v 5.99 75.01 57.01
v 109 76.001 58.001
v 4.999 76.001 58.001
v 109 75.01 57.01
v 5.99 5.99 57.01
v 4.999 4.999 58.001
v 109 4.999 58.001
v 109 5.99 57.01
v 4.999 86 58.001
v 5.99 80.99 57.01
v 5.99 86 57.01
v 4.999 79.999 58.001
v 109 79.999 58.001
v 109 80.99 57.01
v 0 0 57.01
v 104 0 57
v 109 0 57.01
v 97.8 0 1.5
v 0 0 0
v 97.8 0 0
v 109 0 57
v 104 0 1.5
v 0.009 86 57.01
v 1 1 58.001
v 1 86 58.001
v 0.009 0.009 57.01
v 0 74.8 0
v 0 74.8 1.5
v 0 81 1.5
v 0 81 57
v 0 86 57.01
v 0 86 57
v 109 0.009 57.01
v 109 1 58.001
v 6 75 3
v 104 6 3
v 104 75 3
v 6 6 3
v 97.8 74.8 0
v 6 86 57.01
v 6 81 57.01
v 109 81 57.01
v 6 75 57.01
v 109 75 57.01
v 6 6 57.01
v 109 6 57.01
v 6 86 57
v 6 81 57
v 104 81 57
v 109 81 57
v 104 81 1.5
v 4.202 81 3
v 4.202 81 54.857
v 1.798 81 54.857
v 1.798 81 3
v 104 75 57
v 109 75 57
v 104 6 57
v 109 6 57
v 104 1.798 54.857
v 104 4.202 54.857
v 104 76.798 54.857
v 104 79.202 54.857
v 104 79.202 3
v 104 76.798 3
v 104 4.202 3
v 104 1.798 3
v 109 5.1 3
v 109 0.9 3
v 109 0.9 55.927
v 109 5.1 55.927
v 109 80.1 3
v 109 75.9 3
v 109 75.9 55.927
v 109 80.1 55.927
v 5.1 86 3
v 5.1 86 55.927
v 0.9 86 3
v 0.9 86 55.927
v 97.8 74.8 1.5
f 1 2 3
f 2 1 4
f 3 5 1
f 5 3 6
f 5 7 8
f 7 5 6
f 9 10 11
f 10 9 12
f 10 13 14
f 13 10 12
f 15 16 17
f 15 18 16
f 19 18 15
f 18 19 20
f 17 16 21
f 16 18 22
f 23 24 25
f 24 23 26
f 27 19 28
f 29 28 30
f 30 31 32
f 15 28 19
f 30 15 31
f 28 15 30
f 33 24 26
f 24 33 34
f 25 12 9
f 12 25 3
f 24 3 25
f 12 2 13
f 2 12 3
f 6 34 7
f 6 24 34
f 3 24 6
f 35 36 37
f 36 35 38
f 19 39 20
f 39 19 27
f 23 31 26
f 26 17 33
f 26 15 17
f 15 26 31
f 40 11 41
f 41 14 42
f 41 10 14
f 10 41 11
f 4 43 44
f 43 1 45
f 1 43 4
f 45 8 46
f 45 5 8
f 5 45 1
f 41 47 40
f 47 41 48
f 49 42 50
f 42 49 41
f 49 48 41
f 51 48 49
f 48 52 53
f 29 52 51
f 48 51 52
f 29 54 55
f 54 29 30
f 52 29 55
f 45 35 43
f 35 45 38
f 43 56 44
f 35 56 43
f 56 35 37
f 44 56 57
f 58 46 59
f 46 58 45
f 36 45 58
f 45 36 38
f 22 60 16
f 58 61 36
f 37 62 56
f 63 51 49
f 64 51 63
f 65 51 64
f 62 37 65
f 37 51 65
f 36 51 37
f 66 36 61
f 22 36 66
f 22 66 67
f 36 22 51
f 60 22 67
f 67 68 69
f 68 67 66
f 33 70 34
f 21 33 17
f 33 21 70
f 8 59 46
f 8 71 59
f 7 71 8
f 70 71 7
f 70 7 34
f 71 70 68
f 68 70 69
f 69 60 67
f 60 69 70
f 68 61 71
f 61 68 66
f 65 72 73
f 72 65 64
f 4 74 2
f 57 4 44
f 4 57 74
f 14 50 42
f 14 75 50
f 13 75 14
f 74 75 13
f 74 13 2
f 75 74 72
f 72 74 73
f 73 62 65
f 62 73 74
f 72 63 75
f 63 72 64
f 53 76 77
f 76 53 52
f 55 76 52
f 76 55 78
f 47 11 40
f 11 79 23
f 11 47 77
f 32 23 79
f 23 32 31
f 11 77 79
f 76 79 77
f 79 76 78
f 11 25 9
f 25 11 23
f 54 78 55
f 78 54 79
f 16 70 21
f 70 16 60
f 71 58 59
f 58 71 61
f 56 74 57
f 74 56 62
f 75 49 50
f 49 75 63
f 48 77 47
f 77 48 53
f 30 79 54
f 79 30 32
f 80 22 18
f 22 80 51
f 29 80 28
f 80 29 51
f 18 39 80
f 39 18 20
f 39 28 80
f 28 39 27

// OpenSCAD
// ============================================================================
// cutlery_box.scad
// Graduated 3-chamber disposable-cutlery box (Option 3) — CUT-FROM-SOLID port
// of build_box.py, for a 120 x 120 x 120 mm printer (AOSEED).
//
// WHY THIS PORT EXISTS (the whole point):
//   The hand-mesh generator (build_box.py) could not keep the 1 mm rim chamfer
//   continuous across the female dovetail joints, because where a slot's flared
//   corner crosses the sloped chamfer it needs a true boolean intersection.
//   OpenSCAD HAS that boolean kernel, so here we do exactly the "cut-from-solid"
//   thing:
//      1. Build the ENTIRE box as ONE solid, WITH the chamfer already on it.
//      2. difference() out vertical dovetail prisms ( /_\ cross-section ),
//         running from just above the base plate up THROUGH the rim, to both
//         (a) form the sliding-dovetail joints, and
//         (b) split the box into 6 bed-sized pieces.
//   Because the cut is a real boolean through the already-chamfered solid, the
//   sloped chamfer<->slot edge is produced for free => the rim chamfer stays
//   CONTINUOUS across every joint, with none of the sliver hacks.
//
// ----------------------------------------------------------------------------
// HOW TO USE
//   In the app:  set `part` below (or use the Customizer dropdown), F5 to
//                preview, F6 to render, then File > Export > STL.
//   One piece (CLI):
//      openscad -o body_knife_A.stl -D 'part="knife_A"' cutlery_box.scad
//   ALL SIX (bash, run from this folder):
//      for p in knife_A knife_B fork_A fork_B spoon_A spoon_B; do \
//        openscad -o "body_$p.stl" -D "part=\"$p\"" cutlery_box.scad ; done
//   PNG preview of one piece:
//      openscad -o knife_B.png --imgsize=1400,1000 --autocenter --viewall \
//        -D 'part="knife_B"' cutlery_box.scad
//
//   Pieces are modelled in ASSEMBLED coordinates (floor-down, z=0 is the bed),
//   so importing all six STLs together shows the assembled box directly; your
//   slicer will auto-drop each one onto the plate for printing.
//
// BED SANITY: every piece is <= 120 mm in X, Y, Z.
//   Z = 58 mm. Widest piece = spoon at 117 mm (Y). A-halves reach 109 mm (X,
//   including the protruding dovetail key). All under 120.
//
// !! I could NOT run OpenSCAD to verify this file (no binary in my sandbox) !!
//   - The rim chamfer is a SMOOTH, true-45 bevel built from hull() frustums of
//     convex rectangles. Works in every OpenSCAD since ~2015 (incl. Homebrew
//     2021.01). No stepped staircase -- and, crucially, it makes box() a clean
//     well-formed solid so the per-part booleans resolve reliably (the old
//     14-slice staircase was fragile and CGAL was dropping the walls of the
//     interior parts, leaving only the key prisms => "floating boxes").
//   - roof() is still available behind USE_ROOF=true for those who have it
//     (2021.01+ snapshots); for THIS rectangular design it is identical, so it
//     is NOT required.
//   - After F6, check the console for "WARNING"/"not a valid 2-manifold".
//     If a tenon ever looks detached, bump EPS to 0.05.
// ============================================================================


/* [Part to render / export] */
part = "knife_A"; // [knife_A, knife_B, fork_A, fork_B, spoon_A, spoon_B, assembly]

/* [Chamfer method] */
// false = smooth hull() frustum bevel (default, any OpenSCAD); true = roof() (2021.01+)
USE_ROOF = false;

/* [Heights (mm)] */
BASE   = 3.0;     // floor / base-plate thickness
COMP_H = 55.0;    // interior wall height above the floor (cutlery stack depth)

/* [Walls (mm)] */
HOST_T   = 6.0;     // thickness of every wall (thick enough to host a dovetail)
HALF_LEN = 104.0;   // printed length of each half (A = near, B = far); <120 incl. key

/* [Chamber bays (mm)] */
N_COL     = 3;       // columns of cutlery per chamber
KNIFE_COL = 23.0;    // -> knife bay 69  (3 x 19 mm knives + play)
FORK_COL  = 33.0;    // -> fork  bay 99  (3 x 29 mm forks  + play)
SPOON_COL = 37.0;    // -> spoon bay 111 (3 x 34 mm spoons + play, trimmed <120)

/* [Dovetail joint (mm)] */
DT_DEPTH = 5.0;   // tail protrusion past the seam (male key depth)
DT_NECK  = 1.2;   // half-width at the seam face (narrow)
DT_FLARE = 2.1;   // half-width at the tip (wide -> locks)
DT_CLR   = 0.4;   // FLANK/seam slide clearance added to the female socket (do not change for fit)
DT_DEPTH_RELIEF = 0.3; // extra depth on the socket BACK only, so the tail tip never bottoms out

/* [Hidden-dovetail top cap / "hat" (mm)] */
// The dovetail otherwise shows its trapezoid outline on the TOP edge of the wall.
// To hide it, the MALE piece extends the wall's full-width top (chamfer included)
// across the key footprint -> a flush, continuous top. The FEMALE piece gets a
// matching top RECESS (cap footprint + CAP_CLR) so the cap drops straight in.
// Result: the top reads as one surface with a single straight seam line at the cap
// tip; the dovetail joinery lives entirely below the cap.
//
// SELF-SUPPORTING UNDERSIDE: the cap reaches the FULL wall width at the chamfer base
// (so the top edge reads as the wall extended, with NO recessed sliver on the outer
// face), and its underside is ONE planar ramp from the chamfer's OUTER CORNER
// (half-width HOST_T/2 at z = BODY_H-CHAMFER) down to the dovetail-neck half-width
// (CAP_FOOT) at CAP_SLANT_DEG from horizontal. No little horizontal step. The ramp
// reaching full width exactly at the chamfer base means "ramp top" == "chamfer base"
// (CAP_H is DERIVED). The FEMALE recess is the same ramp + CAP_CLR play.
// TRADEOFF: because the cap runs all the way to the outer corner, the female wall
// tapers to ~0 at z = BODY_H-CHAMFER -> a thin feather edge at the joint (gradual at
// CAP_SLANT_DEG, hidden inside the joint when assembled). Accepted per design intent.
CAP_SLANT_DEG = 50;     // cap underside ramp angle from horizontal (50 = self-supporting, long flare)
CAP_FOOT = DT_NECK;     // cap-underside half-width where it meets the dovetail neck
CAP_CLR = 0.3;          // slide clearance so the male cap seats into the female top recess

/* [Rim chamfer (mm)] */
CHAMFER = 1.0;    // 45-deg comfort break broken along the top wall edges

/* [Base half-lap / anti-warp (mm)] */
// Neighbouring base plates overlap as a HORIZONTAL half-lap (shiplap) at mid-base
// height, so corners stay coplanar (no lift/protrusion). Horizontal lap faces do
// NOT bind the vertical-drop assembly. Shingle direction: A->B and knife->fork->spoon.
LAP_LEN = 6;        // overlap past the A/B seam and the knife/fork seam
LAP_LEN_FS = 2;     // overlap past the fork/SPOON seam -- SMALLER: spoon is the
                    // tightest piece (117mm of the 120mm bed); a 6mm lap there
                    // would push spoon to 123mm. 2mm keeps spoon at 119mm.
LAP_Z   = BASE/2;   // 1.5 -- horizontal split height of the lap (bottom vs top half)
LAP_CLR = 0.2;      // in-plane clearance so the shelf isn't a press fit


/* [Hidden] */
EPS      = 0.01;          // tiny overlap so abutting solids fuse cleanly in CGAL
// Upper-chamber pieces (fork, spoon) were cut by a cell plane laid EXACTLY on the
// divider wall's far face (the lower chamber owns that wall). intersection() along a
// plane coincident with an existing box face makes CGAL leave a ZERO-THICKNESS copy
// of the wall face -> edge-manifold + "watertight" but degenerate (OpenSCAD shows it
// as a blue back-face; Tinkercad thickens it into a phantom block). SEAM_EPS nudges
// those cut planes a hair INTO the open bay so they no longer coincide with any box
// face -> no flap. 0.02 mm is physically nothing but is well clear of CGAL's tolerance.
SEAM_EPS = 0.02;
CUT_OVER = 1.0;           // how far dovetail cutters overshoot the rim (clean cut)

BODY_H    = BASE + COMP_H;     // 58  total height
END_WALL  = HOST_T;            // end walls are dovetail hosts too -> equally thick
TOTAL_LEN = 2 * HALF_LEN;      // 208 assembled length (end wall .. end wall)

// hidden-cap ramp geometry (derived).
//   CAP_HW    = cap MAX half-width = HOST_T/2 (the full wall edge) at the chamfer base.
//   CAP_RISE  = vertical height of the self-supporting CAP_SLANT_DEG underside ramp.
//   CAP_ZRAMP = where the cap reaches full width = the chamfer base (BODY_H-CHAMFER), so
//               the ramp runs straight to the chamfer OUTER CORNER (no horizontal step).
//   CAP_ZBOT  = cap bottom = ramp start; CAP_H derived from it (for reference/report).
//   CAP_ZRAMP_R = recess ramp top, shifted down by CAP_CLR so the recess ramp stays
//               parallel to the cap ramp with uniform play.
CAP_HW      = HOST_T/2;   // cap reaches the FULL wall edge at the chamfer base
CAP_RISE    = (CAP_HW - CAP_FOOT) * tan(CAP_SLANT_DEG);
CAP_ZRAMP   = BODY_H - CHAMFER;               // full width exactly at the chamfer base / outer corner
CAP_ZBOT    = CAP_ZRAMP - CAP_RISE;
CAP_H       = BODY_H - CAP_ZBOT;              // derived; reported
CAP_ZRAMP_R = (CAP_ZBOT - CAP_CLR) + CAP_RISE;
// sanity checks
assert(CAP_ZBOT > BASE + 1,
       "cap zone dips too low -- raise CAP_SLANT_DEG");
assert(CAP_HW >= DT_FLARE,
       "cap too narrow to cover the dovetail tail");

// bay widths
KNIFE_BAY = N_COL * KNIFE_COL; // 69
FORK_BAY  = N_COL * FORK_COL;  // 99
SPOON_BAY = N_COL * SPOON_COL; // 111

// ---- Y layout (width direction): wall | bay | divider | bay | divider | bay | wall
KNIFE_Y0 = 0;
KNIFE_Y1 = HOST_T + KNIFE_BAY + HOST_T;        // 0..81   (outer wall + bay + divider)
FORK_Y0  = KNIFE_Y1;                           // 81
FORK_Y1  = FORK_Y0 + FORK_BAY + HOST_T;        // 81..186 (bay + divider)
SPOON_Y0 = FORK_Y1;                            // 186
SPOON_Y1 = SPOON_Y0 + SPOON_BAY + HOST_T;      // 186..303(bay + outer wall)
EXT_W    = SPOON_Y1;                           // 303 total width

// lengthwise wall Y-bands [y0,y1] (host the A/B dovetails) + their centers
OUTER_L  = [0, HOST_T];                                       // [0,6]    c=3
DIV_KF   = [HOST_T + KNIFE_BAY, HOST_T + KNIFE_BAY + HOST_T]; // [75,81]  c=78
DIV_FS   = [FORK_Y0 + FORK_BAY, FORK_Y0 + FORK_BAY + HOST_T]; // [180,186]c=183
OUTER_R  = [SPOON_Y1 - HOST_T, SPOON_Y1];                     // [297,303]c=300

// the three OPEN bays are rectangular holes in the wall footprint:
//   footprint = outer rectangle MINUS these bays  (== the 6 walls; verified).
// The smooth chamfer is built from exactly this decomposition.
BAY_X0 = END_WALL;              // 6
BAY_X1 = TOTAL_LEN - END_WALL;  // 202
BAYS = [
    [BAY_X0, BAY_X1, HOST_T,   HOST_T + KNIFE_BAY],   // knife bay [6,202] x [6,75]
    [BAY_X0, BAY_X1, FORK_Y0,  FORK_Y0 + FORK_BAY],   // fork  bay [6,202] x [81,180]
    [BAY_X0, BAY_X1, SPOON_Y0, SPOON_Y0 + SPOON_BAY], // spoon bay [6,202] x [186,297]
];

YC_OUTL  = OUTER_L[0] + HOST_T/2;   // 3   outer-left wall center
YC_DIVKF = DIV_KF[0]  + HOST_T/2;   // 78  knife/fork divider center
YC_DIVFS = DIV_FS[0]  + HOST_T/2;   // 183 fork/spoon divider center
YC_OUTR  = OUTER_R[0] + HOST_T/2;   // 300 outer-right wall center

// seams
AB_SEAM = HALF_LEN;               // 104  A/B length seam (x)
SEAM_KF = FORK_Y0;                // 81   knife/fork width seam (y)
SEAM_FS = SPOON_Y0;              // 186  fork/spoon width seam (y)
ENDC_A  = END_WALL/2;             // 3    A end-wall center (x) -> chamber dovetails
ENDC_B  = TOTAL_LEN - END_WALL/2; // 205  B end-wall center (x)


// ============================================================================
// 2D wall footprint (cross-section of all walls, constant in z for the straight
// part). Union of: 2 full-width end walls + 4 lengthwise walls between them.
// ============================================================================
module wall_footprint_2d() {
    // footprint = outer rectangle minus the 3 open bays  (== the 6 walls)
    difference() {
        square([TOTAL_LEN, EXT_W]);
        for (b = BAYS) translate([b[0], b[2]]) square([b[1] - b[0], b[3] - b[2]]);
    }
}

// ============================================================================
// The full chamfered box solid = base plate + walls with a continuous 1 mm
// top-rim chamfer. Built ONCE; every piece is carved out of this.
// ============================================================================
module chamfer_cap() {
    // SMOOTH 45 rim chamfer over z[BODY_H-CHAMFER, BODY_H], in absolute coords.
    zm = BODY_H - CHAMFER;
    if (USE_ROOF) {
        // exact straight-skeleton roof, capped at CHAMFER height (needs roof()).
        intersection() {
            translate([0,0,zm]) roof() wall_footprint_2d();
            translate([0,0,zm]) linear_extrude(CHAMFER + EPS) wall_footprint_2d();
        }
    } else {
        // DEFAULT: true 45 bevel as hull() frustums of CONVEX rectangles -> smooth
        // AND a clean manifold.  Since footprint = outer - bays, the chamfer of the
        // footprint = (outer rectangle beveled inward) MINUS (each bay beveled so it
        // grows toward the top, which bevels every bay-facing rim).  All hull()s are
        // on convex rectangles, so nothing gets convex-filled.
        difference() {
            // outer perimeter frustum: full outer rect at zm -> inset by CHAMFER at top
            hull() {
                translate([0,0,zm])     linear_extrude(0.001) square([TOTAL_LEN, EXT_W]);
                translate([0,0,BODY_H]) linear_extrude(0.001) offset(delta=-CHAMFER) square([TOTAL_LEN, EXT_W]);
            }
            // each bay grows by CHAMFER toward the top -> bevels its surrounding rim.
            // (overshoots z a hair past both ends so the cut is clean.)
            for (b = BAYS)
                hull() {
                    translate([0,0,zm-EPS])     linear_extrude(0.001)
                        translate([b[0],b[2]]) offset(delta=-EPS)        square([b[1]-b[0], b[3]-b[2]]);
                    translate([0,0,BODY_H+EPS]) linear_extrude(0.001)
                        translate([b[0],b[2]]) offset(delta=CHAMFER+EPS) square([b[1]-b[0], b[3]-b[2]]);
                }
        }
    }
}

module box() {
    zm = BODY_H - CHAMFER;
    union() {
        cube([TOTAL_LEN, EXT_W, BASE]);                                        // base plate z[0,3]
        translate([0,0,BASE]) linear_extrude(zm - BASE + EPS) wall_footprint_2d(); // straight walls z[3,57]
        chamfer_cap();                                                         // smooth chamfer z[57,58]
    }
}

// ============================================================================
// Dovetail prisms ( /_\ ). Vertical, z[BASE, BODY_H+CUT_OVER] so they cut
// through the rim but leave the base plate continuous. The near face is pushed
// back EPS so a male key always fuses to its wall.
//   male key   : half_n=DT_NECK,         half_f=DT_FLARE
//   female slot: half_n=DT_NECK+DT_CLR,  half_f=DT_FLARE+DT_CLR
// ============================================================================
module dt_prism_X(seam_x, yc, half_n, half_f) {   // perpendicular to X, grows +X
    translate([0,0,BASE]) linear_extrude(BODY_H - BASE + CUT_OVER)
        polygon([[seam_x - EPS,        yc - half_n],
                 [seam_x + DT_DEPTH,   yc - half_f],
                 [seam_x + DT_DEPTH,   yc + half_f],
                 [seam_x - EPS,        yc + half_n]]);
}
module dt_prism_Y(seam_y, xc, half_n, half_f) {   // perpendicular to Y, grows +Y
    translate([0,0,BASE]) linear_extrude(BODY_H - BASE + CUT_OVER)
        polygon([[xc - half_n, seam_y - EPS],
                 [xc - half_f, seam_y + DT_DEPTH],
                 [xc + half_f, seam_y + DT_DEPTH],
                 [xc + half_n, seam_y - EPS]]);
}
module ab_key   (yc)        { dt_prism_X(AB_SEAM, yc, DT_NECK, DT_FLARE); }
module ch_key   (seam_y, xc){ dt_prism_Y(seam_y, xc, DT_NECK, DT_FLARE); }

// Female sockets = male + DT_CLR on the flanks/seam (unchanged), PLUS a straight
// back-face relief of DT_DEPTH_RELIEF so the tail tip never bottoms out. The
// relief is a rectangle tacked onto the trapezoid's tip at the SAME flare width,
// so the angled flank faces (and their 0.4 mm slide clearance) are untouched.
module ab_socket(yc) {
    dt_prism_X(AB_SEAM, yc, DT_NECK + DT_CLR, DT_FLARE + DT_CLR);
    translate([0,0,BASE]) linear_extrude(BODY_H - BASE + CUT_OVER)
        translate([AB_SEAM + DT_DEPTH, yc - (DT_FLARE + DT_CLR)])
            square([DT_DEPTH_RELIEF, 2*(DT_FLARE + DT_CLR)]);          // back relief, +X
}
module ch_socket(seam_y, xc) {
    dt_prism_Y(seam_y, xc, DT_NECK + DT_CLR, DT_FLARE + DT_CLR);
    translate([0,0,BASE]) linear_extrude(BODY_H - BASE + CUT_OVER)
        translate([xc - (DT_FLARE + DT_CLR), seam_y + DT_DEPTH])
            square([2*(DT_FLARE + DT_CLR), DT_DEPTH_RELIEF]);          // back relief, +Y
}

// ===== hidden-dovetail top cap ("hat"), SELF-SUPPORTING underside ===============
// MALE cap: a FULL-wall-width hat whose underside is ONE planar ramp from the chamfer's
// OUTER CORNER (half-width CAP_HW = HOST_T/2 at CAP_ZRAMP = BODY_H-CHAMFER) down to the
// dovetail-neck half-width (CAP_FOOT) at CAP_SLANT_DEG from horizontal -> the self-
// supporting shoulder, running straight to the corner (no horizontal step). Built as
// hull(narrow bottom slab buried in the tail neck, full-width top slab through the rim);
// box() trims it to the wall and adds the continuous rim chamfer for free, so the outer
// top edge reads as the wall extended (no recessed sliver). The protruding NOSE is left
// SQUARE (vertical) -- hidden in the female socket when assembled.
// TRADEOFF: the female wall tapers to ~0 at z=BODY_H-CHAMFER (a thin feather edge at the
// joint, gradual at CAP_SLANT_DEG) -- accepted per design intent.
module ab_cap(yc) {   // A/B seam, grows +X past the seam (length direction)
    hull() {
        translate([AB_SEAM - EPS, yc - CAP_FOOT, CAP_ZBOT])
            cube([DT_DEPTH + EPS, 2*CAP_FOOT, EPS]);
        translate([AB_SEAM - EPS, yc - CAP_HW,   CAP_ZRAMP])
            cube([DT_DEPTH + EPS, 2*CAP_HW, (BODY_H + CUT_OVER) - CAP_ZRAMP]);
    }
}
module ch_cap(seam_y, xc) {   // chamber seam, grows +Y past the seam (in the end wall)
    hull() {
        translate([xc - CAP_FOOT, seam_y - EPS, CAP_ZBOT])
            cube([2*CAP_FOOT, DT_DEPTH + EPS, EPS]);
        translate([xc - CAP_HW,   seam_y - EPS, CAP_ZRAMP])
            cube([2*CAP_HW, DT_DEPTH + EPS, (BODY_H + CUT_OVER) - CAP_ZRAMP]);
    }
}
// FEMALE recess: the SAME ramp grown by CAP_CLR (flanks, tip, floor, and ramp shifted down
// by CAP_CLR so it stays parallel) -> the cap seats with uniform slide clearance. It opens
// to the wall edge (and a hair past, into air) so the cap's full-width corner drops in;
// this is what leaves the thin female feather at the top (accepted). Open upward + toward seam.
module ab_cap_neg(yc) {
    hull() {
        translate([AB_SEAM - EPS, yc - (CAP_FOOT + CAP_CLR), CAP_ZBOT - CAP_CLR])
            cube([DT_DEPTH + CAP_CLR + EPS, 2*(CAP_FOOT + CAP_CLR), EPS]);
        translate([AB_SEAM - EPS, yc - (CAP_HW + CAP_CLR), CAP_ZRAMP_R])
            cube([DT_DEPTH + CAP_CLR + EPS, 2*(CAP_HW + CAP_CLR), (BODY_H + CUT_OVER + 1) - CAP_ZRAMP_R]);
    }
}
module ch_cap_neg(seam_y, xc) {
    hull() {
        translate([xc - (CAP_FOOT + CAP_CLR), seam_y - EPS, CAP_ZBOT - CAP_CLR])
            cube([2*(CAP_FOOT + CAP_CLR), DT_DEPTH + CAP_CLR + EPS, EPS]);
        translate([xc - (CAP_HW + CAP_CLR), seam_y - EPS, CAP_ZRAMP_R])
            cube([2*(CAP_HW + CAP_CLR), DT_DEPTH + CAP_CLR + EPS, (BODY_H + CUT_OVER + 1) - CAP_ZRAMP_R]);
    }
}

// rectangular cell (x[xa,xb], y[ya,yb], full height + margin) used to split pieces
module cell(xa, xb, ya, yb) {
    translate([xa, ya, -1]) cube([xb - xa, yb - ya, BODY_H + 11]);
}

// ===== base half-lap (shiplap) =================================================
// HORIZONTAL lap at mid-base height: the shelf-owner keeps its BOTTOM half
// (z 0..LAP_Z) extending LAP_LEN past the seam; the neighbour has its bottom half
// REMOVED there (keeps only the top half) and lands flat on the shelf. Horizontal
// faces => no binding during the vertical drop. Shelves live entirely in the base
// (z < BASE), well clear of the wall dovetails (z >= BASE).
// Shingle = FEMALE-first (matches the no-notch dovetail assembly order, which
// lowers the male piece onto the female): the B half owns the A/B shelf (grows
// -X into A) and the UPPER chamber (fork, spoon) owns the chamber shelf (grows
// -Y into the lower chamber).  Order: spoon, fork, knife; B before A.
module lap_shelf_X(y0, y1) {                 // B-side shelf, grows -X into A past AB_SEAM
    // +EPS past AB_SEAM so the shelf interpenetrates (not just abuts) its own B body -> fuses cleanly.
    translate([AB_SEAM - LAP_LEN, y0, 0]) cube([LAP_LEN + EPS, y1 - y0, LAP_Z]);
}
module lap_neg_X(y0, y1) {                   // A-side: remove bottom half to receive it
    translate([AB_SEAM - LAP_LEN - LAP_CLR, y0 - EPS, -EPS])
        cube([LAP_LEN + LAP_CLR + EPS, (y1 - y0) + 2*EPS, LAP_Z + EPS]);
}
module lap_shelf_Y(seam_y, x0, x1, ln=LAP_LEN) {   // upper-chamber shelf, grows -Y into lower
    // grows -Y by `ln` into the lower chamber AND +Y by 2*SEAM_EPS past the seam so it
    // always overlaps the (SEAM_EPS-nudged) body floor and stays fused -> no floating shelf.
    translate([x0, seam_y - ln, 0]) cube([x1 - x0, ln + 2*SEAM_EPS, LAP_Z]);
}
module lap_neg_Y(seam_y, x0, x1, ln=LAP_LEN) {     // lower-chamber: remove bottom half
    translate([x0 - EPS, seam_y - ln - LAP_CLR, -EPS])
        cube([(x1 - x0) + 2*EPS, ln + LAP_CLR + EPS, LAP_Z + EPS]);
}

// ============================================================================
// The six pieces.  piece = intersection(box, cell + own male keys) - own sockets
//   A halves are MALE on the A/B seam (keep the key); B halves are FEMALE (slot).
//   On a chamber seam the LEFT chamber is male (+Y), the right chamber is female.
// ============================================================================
// Base half-lap shingling (FEMALE-first, Option 1):
//   A/B seam  -> the B half owns the bottom shelf (grows -X), A has the negative.
//   chamber   -> the UPPER chamber (fork, spoon) owns the shelf (grows -Y); the
//                lower chamber (knife, fork) has the negative.
//   Assembly order: spoon, fork, knife; B before A (male lowered onto female).
// Center crossings (104,81)&(104,186): the CHAMBER shelf (fork_A / spoon_A) owns the
//   crossing square; the B-half A/B shelf (knife_B / fork_B) is CLIPPED short of the
//   chamber seam by LAP_LEN so two shelves never collide.
module knife_A() {                                       // placed LAST; receives everything
    difference() {
        intersection() {
            box();
            union() {
                cell(-1, AB_SEAM, KNIFE_Y0 - 1, KNIFE_Y1);
                ab_key(YC_OUTL); ab_key(YC_DIVKF); ch_key(SEAM_KF, ENDC_A);
                ab_cap(YC_OUTL); ab_cap(YC_DIVKF); ch_cap(SEAM_KF, ENDC_A);  // hide tops (male)
            }
        }
        lap_neg_X(KNIFE_Y0, KNIFE_Y1);            // receive knife_B's A/B shelf
        lap_neg_Y(SEAM_KF, 0, AB_SEAM);           // receive fork_A's chamber shelf
    }
}

module knife_B() {
    difference() {
        union() {
            intersection() {
                box();
                union() {
                    cell(AB_SEAM, TOTAL_LEN + 1, KNIFE_Y0 - 1, KNIFE_Y1);
                    ch_key(SEAM_KF, ENDC_B);
                    ch_cap(SEAM_KF, ENDC_B);                // hide top (male, chamber)
                }
            }
            lap_shelf_X(KNIFE_Y0, KNIFE_Y1 - LAP_LEN);  // A/B shelf -> knife_A (CLIPPED at y=81 crossing)
        }
        ab_socket(YC_OUTL); ab_socket(YC_DIVKF);
        ab_cap_neg(YC_OUTL); ab_cap_neg(YC_DIVKF);      // top recesses to receive knife_A's caps (female)
        lap_neg_Y(SEAM_KF, AB_SEAM, TOTAL_LEN);         // receive fork_B's chamber shelf
    }
}

module fork_A() {
    difference() {
        union() {
            intersection() {
                box();
                union() {
                    cell(-1, AB_SEAM, FORK_Y0 + SEAM_EPS, FORK_Y1);  // -Y cut nudged off the divider face
                    ab_key(YC_DIVFS); ch_key(SEAM_FS, ENDC_A);
                    ab_cap(YC_DIVFS); ch_cap(SEAM_FS, ENDC_A);       // hide tops (male)
                }
            }
            lap_shelf_Y(SEAM_KF, 0, AB_SEAM);           // chamber shelf -> knife_A (owns crossing)
        }
        lap_neg_X(FORK_Y0, FORK_Y1);                    // receive fork_B's A/B shelf
        ch_socket(SEAM_KF, ENDC_A);
        ch_cap_neg(SEAM_KF, ENDC_A);                    // top recess to receive knife_A's chamber cap (female)
        lap_neg_Y(SEAM_FS, 0, AB_SEAM, LAP_LEN_FS);     // receive spoon_A's (small) chamber shelf
    }
}

module fork_B() {
    difference() {
        union() {
            intersection() {
                box();
                union() {
                    cell(AB_SEAM, TOTAL_LEN + 1, FORK_Y0 + SEAM_EPS, FORK_Y1);  // -Y cut nudged off the divider face
                    ch_key(SEAM_FS, ENDC_B);
                    ch_cap(SEAM_FS, ENDC_B);                // hide top (male, chamber)
                }
            }
            lap_shelf_X(FORK_Y0, FORK_Y1 - LAP_LEN_FS); // A/B shelf -> fork_A (CLIPPED at y=186 crossing)
            lap_shelf_Y(SEAM_KF, AB_SEAM, TOTAL_LEN);   // chamber shelf -> knife_B
        }
        ab_socket(YC_DIVFS);
        ab_cap_neg(YC_DIVFS);                           // top recess to receive fork_A's A/B cap (female)
        ch_socket(SEAM_KF, ENDC_B);
        ch_cap_neg(SEAM_KF, ENDC_B);                    // top recess to receive knife_B's chamber cap (female)
        lap_neg_Y(SEAM_FS, AB_SEAM, TOTAL_LEN, LAP_LEN_FS); // receive spoon_B's (small) chamber shelf
    }
}

module spoon_A() {
    difference() {
        union() {
            intersection() {
                box();
                union() {
                    cell(-1, AB_SEAM, SPOON_Y0 + SEAM_EPS, SPOON_Y1 + 1);  // -Y cut nudged off the divider face
                    ab_key(YC_OUTR);
                    ab_cap(YC_OUTR);                        // hide top (male)
                }
            }
            lap_shelf_Y(SEAM_FS, 0, AB_SEAM, LAP_LEN_FS); // chamber shelf -> fork_A (small; owns crossing)
        }
        lap_neg_X(SPOON_Y0, SPOON_Y1);                  // receive spoon_B's A/B shelf
        ch_socket(SEAM_FS, ENDC_A);
        ch_cap_neg(SEAM_FS, ENDC_A);                    // top recess to receive fork_A's chamber cap (female)
    }
}

module spoon_B() {                                      // placed FIRST; owns shelves
    difference() {
        union() {
            intersection() {
                box();
                union() {
                    cell(AB_SEAM, TOTAL_LEN + 1, SPOON_Y0 + SEAM_EPS, SPOON_Y1 + 1);  // -Y cut nudged off the divider face
                }
            }
            lap_shelf_X(SPOON_Y0, SPOON_Y1);            // A/B shelf -> spoon_A
            lap_shelf_Y(SEAM_FS, AB_SEAM, TOTAL_LEN, LAP_LEN_FS); // chamber shelf -> fork_B (small)
        }
        ab_socket(YC_OUTR);
        ab_cap_neg(YC_OUTR);                            // top recess to receive spoon_A's A/B cap (female)
        ch_socket(SEAM_FS, ENDC_B);
        ch_cap_neg(SEAM_FS, ENDC_B);                    // top recess to receive fork_B's chamber cap (female)
    }
}

// Fast preview: the full continuous-chamfer box (no cuts). The six part modules
// above are the real, separable pieces. To instead see the TRUE assembled
// pieces with their joints (slower — 6 booleans), replace box(); below with:
//   knife_A(); knife_B(); fork_A(); fork_B(); spoon_A(); spoon_B();
module assembly() {
    box();
}

// ============================================================================
// Render dispatch
// ============================================================================
if      (part == "knife_A")  knife_A();
else if (part == "knife_B")  knife_B();
else if (part == "fork_A")   fork_A();
else if (part == "fork_B")   fork_B();
else if (part == "spoon_A")  spoon_A();
else if (part == "spoon_B")  spoon_B();
else if (part == "assembly") assembly();
else echo(str("Unknown part: ", part));
